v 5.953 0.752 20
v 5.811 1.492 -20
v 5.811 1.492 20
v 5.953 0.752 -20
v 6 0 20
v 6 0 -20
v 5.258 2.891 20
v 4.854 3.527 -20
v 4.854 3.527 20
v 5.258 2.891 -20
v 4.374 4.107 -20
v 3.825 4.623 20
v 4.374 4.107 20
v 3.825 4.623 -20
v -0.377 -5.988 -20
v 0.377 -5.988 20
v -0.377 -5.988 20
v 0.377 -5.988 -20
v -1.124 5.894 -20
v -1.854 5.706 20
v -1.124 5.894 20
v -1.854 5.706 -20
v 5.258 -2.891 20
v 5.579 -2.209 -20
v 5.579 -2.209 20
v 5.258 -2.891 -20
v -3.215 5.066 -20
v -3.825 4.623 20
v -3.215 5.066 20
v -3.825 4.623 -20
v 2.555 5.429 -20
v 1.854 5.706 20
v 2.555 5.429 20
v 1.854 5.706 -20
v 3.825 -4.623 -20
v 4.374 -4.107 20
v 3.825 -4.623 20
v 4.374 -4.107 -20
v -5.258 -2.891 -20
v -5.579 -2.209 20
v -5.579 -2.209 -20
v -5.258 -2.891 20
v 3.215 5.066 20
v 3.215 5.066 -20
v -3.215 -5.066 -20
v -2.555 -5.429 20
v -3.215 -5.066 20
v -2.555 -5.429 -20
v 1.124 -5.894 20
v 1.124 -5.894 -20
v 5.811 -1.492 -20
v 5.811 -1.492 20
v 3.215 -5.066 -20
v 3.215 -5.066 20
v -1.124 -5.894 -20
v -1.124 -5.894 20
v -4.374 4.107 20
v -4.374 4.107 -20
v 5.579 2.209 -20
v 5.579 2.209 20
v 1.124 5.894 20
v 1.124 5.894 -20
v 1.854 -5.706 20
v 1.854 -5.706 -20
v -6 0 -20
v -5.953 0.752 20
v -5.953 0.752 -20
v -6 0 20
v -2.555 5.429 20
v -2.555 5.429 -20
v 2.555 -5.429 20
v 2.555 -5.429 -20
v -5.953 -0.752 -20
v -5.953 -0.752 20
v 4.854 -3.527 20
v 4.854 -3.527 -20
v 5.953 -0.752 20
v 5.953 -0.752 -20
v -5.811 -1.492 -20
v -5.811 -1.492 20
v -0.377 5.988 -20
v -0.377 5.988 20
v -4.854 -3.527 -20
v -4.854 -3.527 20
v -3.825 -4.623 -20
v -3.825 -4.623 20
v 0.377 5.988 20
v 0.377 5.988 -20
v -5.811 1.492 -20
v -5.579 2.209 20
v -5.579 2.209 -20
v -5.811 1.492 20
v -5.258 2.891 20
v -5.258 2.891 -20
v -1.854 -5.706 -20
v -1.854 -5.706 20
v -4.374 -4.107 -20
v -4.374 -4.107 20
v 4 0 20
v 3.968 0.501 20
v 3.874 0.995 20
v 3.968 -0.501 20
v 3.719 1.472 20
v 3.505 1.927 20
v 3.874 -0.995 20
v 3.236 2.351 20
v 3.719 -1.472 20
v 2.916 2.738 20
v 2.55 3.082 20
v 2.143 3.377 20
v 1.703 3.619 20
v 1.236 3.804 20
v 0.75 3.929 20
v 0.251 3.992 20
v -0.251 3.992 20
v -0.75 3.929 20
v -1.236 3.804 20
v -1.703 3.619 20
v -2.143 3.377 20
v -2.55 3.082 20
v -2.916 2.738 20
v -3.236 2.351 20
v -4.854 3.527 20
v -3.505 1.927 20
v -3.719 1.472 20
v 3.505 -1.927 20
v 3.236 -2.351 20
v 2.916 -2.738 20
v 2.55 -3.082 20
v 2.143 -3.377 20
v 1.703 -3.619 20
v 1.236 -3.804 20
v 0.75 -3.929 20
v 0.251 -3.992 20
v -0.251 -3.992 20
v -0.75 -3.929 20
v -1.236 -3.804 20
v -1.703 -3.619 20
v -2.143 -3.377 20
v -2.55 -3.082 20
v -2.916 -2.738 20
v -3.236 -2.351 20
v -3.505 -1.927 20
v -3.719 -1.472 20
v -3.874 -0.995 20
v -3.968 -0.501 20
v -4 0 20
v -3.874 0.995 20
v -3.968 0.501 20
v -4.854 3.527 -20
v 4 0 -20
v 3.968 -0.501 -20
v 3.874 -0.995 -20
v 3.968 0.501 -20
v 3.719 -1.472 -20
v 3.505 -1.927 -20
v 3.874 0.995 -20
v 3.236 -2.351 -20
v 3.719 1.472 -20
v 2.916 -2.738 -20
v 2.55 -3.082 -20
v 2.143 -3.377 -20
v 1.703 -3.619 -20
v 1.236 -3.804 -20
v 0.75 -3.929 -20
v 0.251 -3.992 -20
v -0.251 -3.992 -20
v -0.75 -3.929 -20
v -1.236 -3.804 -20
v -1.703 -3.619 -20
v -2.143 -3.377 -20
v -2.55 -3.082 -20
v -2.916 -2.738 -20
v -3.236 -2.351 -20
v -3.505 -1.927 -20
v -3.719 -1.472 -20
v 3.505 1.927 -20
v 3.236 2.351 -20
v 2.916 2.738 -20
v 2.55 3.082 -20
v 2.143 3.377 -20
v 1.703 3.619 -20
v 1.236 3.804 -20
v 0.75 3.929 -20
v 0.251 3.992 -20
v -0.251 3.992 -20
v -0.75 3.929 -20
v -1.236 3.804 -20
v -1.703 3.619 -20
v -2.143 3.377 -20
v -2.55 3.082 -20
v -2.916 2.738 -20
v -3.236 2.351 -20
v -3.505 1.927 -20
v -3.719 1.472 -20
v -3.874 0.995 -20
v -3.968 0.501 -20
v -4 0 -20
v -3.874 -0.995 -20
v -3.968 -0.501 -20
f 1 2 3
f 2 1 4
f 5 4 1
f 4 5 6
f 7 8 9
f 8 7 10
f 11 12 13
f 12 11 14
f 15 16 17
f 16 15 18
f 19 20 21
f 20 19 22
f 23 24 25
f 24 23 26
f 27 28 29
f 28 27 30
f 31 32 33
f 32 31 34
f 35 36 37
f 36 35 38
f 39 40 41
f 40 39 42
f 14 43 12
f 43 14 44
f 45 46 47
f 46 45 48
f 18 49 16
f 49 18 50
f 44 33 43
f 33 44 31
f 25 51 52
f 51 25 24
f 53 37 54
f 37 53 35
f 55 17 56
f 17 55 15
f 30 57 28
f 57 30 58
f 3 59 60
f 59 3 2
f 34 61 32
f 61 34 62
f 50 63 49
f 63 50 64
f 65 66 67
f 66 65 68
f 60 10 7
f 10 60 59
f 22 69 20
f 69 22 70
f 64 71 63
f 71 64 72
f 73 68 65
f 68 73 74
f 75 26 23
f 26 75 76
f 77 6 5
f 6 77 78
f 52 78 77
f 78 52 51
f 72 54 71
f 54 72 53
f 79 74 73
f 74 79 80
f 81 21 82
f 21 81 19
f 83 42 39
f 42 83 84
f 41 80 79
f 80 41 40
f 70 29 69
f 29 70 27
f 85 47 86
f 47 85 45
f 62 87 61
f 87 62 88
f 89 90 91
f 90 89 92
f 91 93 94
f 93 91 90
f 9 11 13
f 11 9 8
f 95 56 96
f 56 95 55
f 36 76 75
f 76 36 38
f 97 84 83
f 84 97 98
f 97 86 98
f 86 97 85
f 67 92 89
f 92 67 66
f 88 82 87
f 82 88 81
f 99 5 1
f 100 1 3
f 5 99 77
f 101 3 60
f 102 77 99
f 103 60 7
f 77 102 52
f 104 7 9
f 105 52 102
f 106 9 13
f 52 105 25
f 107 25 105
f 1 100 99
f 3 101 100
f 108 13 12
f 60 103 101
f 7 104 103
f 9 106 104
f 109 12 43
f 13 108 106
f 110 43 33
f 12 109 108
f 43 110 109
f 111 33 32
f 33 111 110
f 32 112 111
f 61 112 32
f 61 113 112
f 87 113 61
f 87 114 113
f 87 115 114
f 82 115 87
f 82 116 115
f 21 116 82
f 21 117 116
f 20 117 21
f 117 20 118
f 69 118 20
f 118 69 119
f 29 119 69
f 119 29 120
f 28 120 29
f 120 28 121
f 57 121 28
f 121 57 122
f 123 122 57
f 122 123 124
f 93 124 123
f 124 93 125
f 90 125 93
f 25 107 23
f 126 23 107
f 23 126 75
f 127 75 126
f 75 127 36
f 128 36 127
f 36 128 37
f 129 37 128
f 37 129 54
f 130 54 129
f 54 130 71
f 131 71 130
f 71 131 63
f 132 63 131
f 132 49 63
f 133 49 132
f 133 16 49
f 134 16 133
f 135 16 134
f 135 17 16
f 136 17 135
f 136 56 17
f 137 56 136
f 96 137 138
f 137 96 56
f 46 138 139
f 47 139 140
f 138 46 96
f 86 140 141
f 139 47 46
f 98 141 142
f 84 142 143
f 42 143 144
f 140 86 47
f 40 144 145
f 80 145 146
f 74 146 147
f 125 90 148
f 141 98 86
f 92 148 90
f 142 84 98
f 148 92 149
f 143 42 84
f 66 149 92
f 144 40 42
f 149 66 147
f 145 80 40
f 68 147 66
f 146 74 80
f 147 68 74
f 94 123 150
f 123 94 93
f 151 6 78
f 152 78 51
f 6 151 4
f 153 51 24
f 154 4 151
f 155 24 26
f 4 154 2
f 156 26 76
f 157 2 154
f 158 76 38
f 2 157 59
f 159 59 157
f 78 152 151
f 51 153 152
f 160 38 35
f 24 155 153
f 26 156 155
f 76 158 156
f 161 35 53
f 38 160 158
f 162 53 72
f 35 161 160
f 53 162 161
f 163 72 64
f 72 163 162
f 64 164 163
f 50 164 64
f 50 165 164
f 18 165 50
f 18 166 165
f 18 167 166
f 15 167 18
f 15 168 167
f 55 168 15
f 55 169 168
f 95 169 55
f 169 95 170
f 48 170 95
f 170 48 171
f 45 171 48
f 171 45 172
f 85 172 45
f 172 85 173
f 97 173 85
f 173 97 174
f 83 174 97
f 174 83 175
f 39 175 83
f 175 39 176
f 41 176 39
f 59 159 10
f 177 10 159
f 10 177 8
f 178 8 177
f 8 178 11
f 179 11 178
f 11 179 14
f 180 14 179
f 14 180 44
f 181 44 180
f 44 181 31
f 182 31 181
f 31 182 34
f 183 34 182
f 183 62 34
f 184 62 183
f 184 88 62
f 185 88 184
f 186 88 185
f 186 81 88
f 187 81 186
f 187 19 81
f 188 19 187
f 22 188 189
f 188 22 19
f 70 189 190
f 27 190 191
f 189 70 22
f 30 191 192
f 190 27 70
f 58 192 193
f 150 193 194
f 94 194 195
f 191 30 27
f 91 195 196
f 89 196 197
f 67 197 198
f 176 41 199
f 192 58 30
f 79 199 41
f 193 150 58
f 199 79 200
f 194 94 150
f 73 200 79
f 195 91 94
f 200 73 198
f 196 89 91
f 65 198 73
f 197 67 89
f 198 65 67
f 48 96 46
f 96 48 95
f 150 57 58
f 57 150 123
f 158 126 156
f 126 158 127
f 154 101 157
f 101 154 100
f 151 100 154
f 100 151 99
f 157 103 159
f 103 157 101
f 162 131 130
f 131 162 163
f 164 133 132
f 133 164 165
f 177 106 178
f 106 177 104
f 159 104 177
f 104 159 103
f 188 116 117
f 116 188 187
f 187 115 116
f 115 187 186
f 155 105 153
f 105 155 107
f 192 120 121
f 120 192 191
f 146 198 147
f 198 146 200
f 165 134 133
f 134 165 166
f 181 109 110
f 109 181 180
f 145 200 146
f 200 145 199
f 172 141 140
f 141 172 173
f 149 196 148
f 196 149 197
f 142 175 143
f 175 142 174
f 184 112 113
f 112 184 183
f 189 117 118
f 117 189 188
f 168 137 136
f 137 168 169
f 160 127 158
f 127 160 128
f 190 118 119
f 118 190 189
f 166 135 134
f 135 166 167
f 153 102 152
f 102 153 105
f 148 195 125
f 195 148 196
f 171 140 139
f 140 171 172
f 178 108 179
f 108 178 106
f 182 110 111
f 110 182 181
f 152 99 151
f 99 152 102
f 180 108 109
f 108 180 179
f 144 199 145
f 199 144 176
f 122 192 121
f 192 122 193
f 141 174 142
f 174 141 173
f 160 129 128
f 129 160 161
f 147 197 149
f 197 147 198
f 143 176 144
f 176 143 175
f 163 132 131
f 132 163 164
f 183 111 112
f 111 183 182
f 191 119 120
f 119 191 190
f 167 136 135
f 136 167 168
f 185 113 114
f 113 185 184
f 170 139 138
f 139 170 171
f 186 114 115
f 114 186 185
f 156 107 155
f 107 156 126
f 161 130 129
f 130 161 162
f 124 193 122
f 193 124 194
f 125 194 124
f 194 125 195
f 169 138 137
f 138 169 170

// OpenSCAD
$fn = 50;


difference() {
	union() {
		translate(v = [0, 0, -20.0000000000]) {
			cylinder(h = 40, r = 6.0000000000);
		}
	}
	union() {
		translate(v = [0, 0, -100.0000000000]) {
			cylinder(h = 200, r = 4.0000000000);
		}
	}
}
